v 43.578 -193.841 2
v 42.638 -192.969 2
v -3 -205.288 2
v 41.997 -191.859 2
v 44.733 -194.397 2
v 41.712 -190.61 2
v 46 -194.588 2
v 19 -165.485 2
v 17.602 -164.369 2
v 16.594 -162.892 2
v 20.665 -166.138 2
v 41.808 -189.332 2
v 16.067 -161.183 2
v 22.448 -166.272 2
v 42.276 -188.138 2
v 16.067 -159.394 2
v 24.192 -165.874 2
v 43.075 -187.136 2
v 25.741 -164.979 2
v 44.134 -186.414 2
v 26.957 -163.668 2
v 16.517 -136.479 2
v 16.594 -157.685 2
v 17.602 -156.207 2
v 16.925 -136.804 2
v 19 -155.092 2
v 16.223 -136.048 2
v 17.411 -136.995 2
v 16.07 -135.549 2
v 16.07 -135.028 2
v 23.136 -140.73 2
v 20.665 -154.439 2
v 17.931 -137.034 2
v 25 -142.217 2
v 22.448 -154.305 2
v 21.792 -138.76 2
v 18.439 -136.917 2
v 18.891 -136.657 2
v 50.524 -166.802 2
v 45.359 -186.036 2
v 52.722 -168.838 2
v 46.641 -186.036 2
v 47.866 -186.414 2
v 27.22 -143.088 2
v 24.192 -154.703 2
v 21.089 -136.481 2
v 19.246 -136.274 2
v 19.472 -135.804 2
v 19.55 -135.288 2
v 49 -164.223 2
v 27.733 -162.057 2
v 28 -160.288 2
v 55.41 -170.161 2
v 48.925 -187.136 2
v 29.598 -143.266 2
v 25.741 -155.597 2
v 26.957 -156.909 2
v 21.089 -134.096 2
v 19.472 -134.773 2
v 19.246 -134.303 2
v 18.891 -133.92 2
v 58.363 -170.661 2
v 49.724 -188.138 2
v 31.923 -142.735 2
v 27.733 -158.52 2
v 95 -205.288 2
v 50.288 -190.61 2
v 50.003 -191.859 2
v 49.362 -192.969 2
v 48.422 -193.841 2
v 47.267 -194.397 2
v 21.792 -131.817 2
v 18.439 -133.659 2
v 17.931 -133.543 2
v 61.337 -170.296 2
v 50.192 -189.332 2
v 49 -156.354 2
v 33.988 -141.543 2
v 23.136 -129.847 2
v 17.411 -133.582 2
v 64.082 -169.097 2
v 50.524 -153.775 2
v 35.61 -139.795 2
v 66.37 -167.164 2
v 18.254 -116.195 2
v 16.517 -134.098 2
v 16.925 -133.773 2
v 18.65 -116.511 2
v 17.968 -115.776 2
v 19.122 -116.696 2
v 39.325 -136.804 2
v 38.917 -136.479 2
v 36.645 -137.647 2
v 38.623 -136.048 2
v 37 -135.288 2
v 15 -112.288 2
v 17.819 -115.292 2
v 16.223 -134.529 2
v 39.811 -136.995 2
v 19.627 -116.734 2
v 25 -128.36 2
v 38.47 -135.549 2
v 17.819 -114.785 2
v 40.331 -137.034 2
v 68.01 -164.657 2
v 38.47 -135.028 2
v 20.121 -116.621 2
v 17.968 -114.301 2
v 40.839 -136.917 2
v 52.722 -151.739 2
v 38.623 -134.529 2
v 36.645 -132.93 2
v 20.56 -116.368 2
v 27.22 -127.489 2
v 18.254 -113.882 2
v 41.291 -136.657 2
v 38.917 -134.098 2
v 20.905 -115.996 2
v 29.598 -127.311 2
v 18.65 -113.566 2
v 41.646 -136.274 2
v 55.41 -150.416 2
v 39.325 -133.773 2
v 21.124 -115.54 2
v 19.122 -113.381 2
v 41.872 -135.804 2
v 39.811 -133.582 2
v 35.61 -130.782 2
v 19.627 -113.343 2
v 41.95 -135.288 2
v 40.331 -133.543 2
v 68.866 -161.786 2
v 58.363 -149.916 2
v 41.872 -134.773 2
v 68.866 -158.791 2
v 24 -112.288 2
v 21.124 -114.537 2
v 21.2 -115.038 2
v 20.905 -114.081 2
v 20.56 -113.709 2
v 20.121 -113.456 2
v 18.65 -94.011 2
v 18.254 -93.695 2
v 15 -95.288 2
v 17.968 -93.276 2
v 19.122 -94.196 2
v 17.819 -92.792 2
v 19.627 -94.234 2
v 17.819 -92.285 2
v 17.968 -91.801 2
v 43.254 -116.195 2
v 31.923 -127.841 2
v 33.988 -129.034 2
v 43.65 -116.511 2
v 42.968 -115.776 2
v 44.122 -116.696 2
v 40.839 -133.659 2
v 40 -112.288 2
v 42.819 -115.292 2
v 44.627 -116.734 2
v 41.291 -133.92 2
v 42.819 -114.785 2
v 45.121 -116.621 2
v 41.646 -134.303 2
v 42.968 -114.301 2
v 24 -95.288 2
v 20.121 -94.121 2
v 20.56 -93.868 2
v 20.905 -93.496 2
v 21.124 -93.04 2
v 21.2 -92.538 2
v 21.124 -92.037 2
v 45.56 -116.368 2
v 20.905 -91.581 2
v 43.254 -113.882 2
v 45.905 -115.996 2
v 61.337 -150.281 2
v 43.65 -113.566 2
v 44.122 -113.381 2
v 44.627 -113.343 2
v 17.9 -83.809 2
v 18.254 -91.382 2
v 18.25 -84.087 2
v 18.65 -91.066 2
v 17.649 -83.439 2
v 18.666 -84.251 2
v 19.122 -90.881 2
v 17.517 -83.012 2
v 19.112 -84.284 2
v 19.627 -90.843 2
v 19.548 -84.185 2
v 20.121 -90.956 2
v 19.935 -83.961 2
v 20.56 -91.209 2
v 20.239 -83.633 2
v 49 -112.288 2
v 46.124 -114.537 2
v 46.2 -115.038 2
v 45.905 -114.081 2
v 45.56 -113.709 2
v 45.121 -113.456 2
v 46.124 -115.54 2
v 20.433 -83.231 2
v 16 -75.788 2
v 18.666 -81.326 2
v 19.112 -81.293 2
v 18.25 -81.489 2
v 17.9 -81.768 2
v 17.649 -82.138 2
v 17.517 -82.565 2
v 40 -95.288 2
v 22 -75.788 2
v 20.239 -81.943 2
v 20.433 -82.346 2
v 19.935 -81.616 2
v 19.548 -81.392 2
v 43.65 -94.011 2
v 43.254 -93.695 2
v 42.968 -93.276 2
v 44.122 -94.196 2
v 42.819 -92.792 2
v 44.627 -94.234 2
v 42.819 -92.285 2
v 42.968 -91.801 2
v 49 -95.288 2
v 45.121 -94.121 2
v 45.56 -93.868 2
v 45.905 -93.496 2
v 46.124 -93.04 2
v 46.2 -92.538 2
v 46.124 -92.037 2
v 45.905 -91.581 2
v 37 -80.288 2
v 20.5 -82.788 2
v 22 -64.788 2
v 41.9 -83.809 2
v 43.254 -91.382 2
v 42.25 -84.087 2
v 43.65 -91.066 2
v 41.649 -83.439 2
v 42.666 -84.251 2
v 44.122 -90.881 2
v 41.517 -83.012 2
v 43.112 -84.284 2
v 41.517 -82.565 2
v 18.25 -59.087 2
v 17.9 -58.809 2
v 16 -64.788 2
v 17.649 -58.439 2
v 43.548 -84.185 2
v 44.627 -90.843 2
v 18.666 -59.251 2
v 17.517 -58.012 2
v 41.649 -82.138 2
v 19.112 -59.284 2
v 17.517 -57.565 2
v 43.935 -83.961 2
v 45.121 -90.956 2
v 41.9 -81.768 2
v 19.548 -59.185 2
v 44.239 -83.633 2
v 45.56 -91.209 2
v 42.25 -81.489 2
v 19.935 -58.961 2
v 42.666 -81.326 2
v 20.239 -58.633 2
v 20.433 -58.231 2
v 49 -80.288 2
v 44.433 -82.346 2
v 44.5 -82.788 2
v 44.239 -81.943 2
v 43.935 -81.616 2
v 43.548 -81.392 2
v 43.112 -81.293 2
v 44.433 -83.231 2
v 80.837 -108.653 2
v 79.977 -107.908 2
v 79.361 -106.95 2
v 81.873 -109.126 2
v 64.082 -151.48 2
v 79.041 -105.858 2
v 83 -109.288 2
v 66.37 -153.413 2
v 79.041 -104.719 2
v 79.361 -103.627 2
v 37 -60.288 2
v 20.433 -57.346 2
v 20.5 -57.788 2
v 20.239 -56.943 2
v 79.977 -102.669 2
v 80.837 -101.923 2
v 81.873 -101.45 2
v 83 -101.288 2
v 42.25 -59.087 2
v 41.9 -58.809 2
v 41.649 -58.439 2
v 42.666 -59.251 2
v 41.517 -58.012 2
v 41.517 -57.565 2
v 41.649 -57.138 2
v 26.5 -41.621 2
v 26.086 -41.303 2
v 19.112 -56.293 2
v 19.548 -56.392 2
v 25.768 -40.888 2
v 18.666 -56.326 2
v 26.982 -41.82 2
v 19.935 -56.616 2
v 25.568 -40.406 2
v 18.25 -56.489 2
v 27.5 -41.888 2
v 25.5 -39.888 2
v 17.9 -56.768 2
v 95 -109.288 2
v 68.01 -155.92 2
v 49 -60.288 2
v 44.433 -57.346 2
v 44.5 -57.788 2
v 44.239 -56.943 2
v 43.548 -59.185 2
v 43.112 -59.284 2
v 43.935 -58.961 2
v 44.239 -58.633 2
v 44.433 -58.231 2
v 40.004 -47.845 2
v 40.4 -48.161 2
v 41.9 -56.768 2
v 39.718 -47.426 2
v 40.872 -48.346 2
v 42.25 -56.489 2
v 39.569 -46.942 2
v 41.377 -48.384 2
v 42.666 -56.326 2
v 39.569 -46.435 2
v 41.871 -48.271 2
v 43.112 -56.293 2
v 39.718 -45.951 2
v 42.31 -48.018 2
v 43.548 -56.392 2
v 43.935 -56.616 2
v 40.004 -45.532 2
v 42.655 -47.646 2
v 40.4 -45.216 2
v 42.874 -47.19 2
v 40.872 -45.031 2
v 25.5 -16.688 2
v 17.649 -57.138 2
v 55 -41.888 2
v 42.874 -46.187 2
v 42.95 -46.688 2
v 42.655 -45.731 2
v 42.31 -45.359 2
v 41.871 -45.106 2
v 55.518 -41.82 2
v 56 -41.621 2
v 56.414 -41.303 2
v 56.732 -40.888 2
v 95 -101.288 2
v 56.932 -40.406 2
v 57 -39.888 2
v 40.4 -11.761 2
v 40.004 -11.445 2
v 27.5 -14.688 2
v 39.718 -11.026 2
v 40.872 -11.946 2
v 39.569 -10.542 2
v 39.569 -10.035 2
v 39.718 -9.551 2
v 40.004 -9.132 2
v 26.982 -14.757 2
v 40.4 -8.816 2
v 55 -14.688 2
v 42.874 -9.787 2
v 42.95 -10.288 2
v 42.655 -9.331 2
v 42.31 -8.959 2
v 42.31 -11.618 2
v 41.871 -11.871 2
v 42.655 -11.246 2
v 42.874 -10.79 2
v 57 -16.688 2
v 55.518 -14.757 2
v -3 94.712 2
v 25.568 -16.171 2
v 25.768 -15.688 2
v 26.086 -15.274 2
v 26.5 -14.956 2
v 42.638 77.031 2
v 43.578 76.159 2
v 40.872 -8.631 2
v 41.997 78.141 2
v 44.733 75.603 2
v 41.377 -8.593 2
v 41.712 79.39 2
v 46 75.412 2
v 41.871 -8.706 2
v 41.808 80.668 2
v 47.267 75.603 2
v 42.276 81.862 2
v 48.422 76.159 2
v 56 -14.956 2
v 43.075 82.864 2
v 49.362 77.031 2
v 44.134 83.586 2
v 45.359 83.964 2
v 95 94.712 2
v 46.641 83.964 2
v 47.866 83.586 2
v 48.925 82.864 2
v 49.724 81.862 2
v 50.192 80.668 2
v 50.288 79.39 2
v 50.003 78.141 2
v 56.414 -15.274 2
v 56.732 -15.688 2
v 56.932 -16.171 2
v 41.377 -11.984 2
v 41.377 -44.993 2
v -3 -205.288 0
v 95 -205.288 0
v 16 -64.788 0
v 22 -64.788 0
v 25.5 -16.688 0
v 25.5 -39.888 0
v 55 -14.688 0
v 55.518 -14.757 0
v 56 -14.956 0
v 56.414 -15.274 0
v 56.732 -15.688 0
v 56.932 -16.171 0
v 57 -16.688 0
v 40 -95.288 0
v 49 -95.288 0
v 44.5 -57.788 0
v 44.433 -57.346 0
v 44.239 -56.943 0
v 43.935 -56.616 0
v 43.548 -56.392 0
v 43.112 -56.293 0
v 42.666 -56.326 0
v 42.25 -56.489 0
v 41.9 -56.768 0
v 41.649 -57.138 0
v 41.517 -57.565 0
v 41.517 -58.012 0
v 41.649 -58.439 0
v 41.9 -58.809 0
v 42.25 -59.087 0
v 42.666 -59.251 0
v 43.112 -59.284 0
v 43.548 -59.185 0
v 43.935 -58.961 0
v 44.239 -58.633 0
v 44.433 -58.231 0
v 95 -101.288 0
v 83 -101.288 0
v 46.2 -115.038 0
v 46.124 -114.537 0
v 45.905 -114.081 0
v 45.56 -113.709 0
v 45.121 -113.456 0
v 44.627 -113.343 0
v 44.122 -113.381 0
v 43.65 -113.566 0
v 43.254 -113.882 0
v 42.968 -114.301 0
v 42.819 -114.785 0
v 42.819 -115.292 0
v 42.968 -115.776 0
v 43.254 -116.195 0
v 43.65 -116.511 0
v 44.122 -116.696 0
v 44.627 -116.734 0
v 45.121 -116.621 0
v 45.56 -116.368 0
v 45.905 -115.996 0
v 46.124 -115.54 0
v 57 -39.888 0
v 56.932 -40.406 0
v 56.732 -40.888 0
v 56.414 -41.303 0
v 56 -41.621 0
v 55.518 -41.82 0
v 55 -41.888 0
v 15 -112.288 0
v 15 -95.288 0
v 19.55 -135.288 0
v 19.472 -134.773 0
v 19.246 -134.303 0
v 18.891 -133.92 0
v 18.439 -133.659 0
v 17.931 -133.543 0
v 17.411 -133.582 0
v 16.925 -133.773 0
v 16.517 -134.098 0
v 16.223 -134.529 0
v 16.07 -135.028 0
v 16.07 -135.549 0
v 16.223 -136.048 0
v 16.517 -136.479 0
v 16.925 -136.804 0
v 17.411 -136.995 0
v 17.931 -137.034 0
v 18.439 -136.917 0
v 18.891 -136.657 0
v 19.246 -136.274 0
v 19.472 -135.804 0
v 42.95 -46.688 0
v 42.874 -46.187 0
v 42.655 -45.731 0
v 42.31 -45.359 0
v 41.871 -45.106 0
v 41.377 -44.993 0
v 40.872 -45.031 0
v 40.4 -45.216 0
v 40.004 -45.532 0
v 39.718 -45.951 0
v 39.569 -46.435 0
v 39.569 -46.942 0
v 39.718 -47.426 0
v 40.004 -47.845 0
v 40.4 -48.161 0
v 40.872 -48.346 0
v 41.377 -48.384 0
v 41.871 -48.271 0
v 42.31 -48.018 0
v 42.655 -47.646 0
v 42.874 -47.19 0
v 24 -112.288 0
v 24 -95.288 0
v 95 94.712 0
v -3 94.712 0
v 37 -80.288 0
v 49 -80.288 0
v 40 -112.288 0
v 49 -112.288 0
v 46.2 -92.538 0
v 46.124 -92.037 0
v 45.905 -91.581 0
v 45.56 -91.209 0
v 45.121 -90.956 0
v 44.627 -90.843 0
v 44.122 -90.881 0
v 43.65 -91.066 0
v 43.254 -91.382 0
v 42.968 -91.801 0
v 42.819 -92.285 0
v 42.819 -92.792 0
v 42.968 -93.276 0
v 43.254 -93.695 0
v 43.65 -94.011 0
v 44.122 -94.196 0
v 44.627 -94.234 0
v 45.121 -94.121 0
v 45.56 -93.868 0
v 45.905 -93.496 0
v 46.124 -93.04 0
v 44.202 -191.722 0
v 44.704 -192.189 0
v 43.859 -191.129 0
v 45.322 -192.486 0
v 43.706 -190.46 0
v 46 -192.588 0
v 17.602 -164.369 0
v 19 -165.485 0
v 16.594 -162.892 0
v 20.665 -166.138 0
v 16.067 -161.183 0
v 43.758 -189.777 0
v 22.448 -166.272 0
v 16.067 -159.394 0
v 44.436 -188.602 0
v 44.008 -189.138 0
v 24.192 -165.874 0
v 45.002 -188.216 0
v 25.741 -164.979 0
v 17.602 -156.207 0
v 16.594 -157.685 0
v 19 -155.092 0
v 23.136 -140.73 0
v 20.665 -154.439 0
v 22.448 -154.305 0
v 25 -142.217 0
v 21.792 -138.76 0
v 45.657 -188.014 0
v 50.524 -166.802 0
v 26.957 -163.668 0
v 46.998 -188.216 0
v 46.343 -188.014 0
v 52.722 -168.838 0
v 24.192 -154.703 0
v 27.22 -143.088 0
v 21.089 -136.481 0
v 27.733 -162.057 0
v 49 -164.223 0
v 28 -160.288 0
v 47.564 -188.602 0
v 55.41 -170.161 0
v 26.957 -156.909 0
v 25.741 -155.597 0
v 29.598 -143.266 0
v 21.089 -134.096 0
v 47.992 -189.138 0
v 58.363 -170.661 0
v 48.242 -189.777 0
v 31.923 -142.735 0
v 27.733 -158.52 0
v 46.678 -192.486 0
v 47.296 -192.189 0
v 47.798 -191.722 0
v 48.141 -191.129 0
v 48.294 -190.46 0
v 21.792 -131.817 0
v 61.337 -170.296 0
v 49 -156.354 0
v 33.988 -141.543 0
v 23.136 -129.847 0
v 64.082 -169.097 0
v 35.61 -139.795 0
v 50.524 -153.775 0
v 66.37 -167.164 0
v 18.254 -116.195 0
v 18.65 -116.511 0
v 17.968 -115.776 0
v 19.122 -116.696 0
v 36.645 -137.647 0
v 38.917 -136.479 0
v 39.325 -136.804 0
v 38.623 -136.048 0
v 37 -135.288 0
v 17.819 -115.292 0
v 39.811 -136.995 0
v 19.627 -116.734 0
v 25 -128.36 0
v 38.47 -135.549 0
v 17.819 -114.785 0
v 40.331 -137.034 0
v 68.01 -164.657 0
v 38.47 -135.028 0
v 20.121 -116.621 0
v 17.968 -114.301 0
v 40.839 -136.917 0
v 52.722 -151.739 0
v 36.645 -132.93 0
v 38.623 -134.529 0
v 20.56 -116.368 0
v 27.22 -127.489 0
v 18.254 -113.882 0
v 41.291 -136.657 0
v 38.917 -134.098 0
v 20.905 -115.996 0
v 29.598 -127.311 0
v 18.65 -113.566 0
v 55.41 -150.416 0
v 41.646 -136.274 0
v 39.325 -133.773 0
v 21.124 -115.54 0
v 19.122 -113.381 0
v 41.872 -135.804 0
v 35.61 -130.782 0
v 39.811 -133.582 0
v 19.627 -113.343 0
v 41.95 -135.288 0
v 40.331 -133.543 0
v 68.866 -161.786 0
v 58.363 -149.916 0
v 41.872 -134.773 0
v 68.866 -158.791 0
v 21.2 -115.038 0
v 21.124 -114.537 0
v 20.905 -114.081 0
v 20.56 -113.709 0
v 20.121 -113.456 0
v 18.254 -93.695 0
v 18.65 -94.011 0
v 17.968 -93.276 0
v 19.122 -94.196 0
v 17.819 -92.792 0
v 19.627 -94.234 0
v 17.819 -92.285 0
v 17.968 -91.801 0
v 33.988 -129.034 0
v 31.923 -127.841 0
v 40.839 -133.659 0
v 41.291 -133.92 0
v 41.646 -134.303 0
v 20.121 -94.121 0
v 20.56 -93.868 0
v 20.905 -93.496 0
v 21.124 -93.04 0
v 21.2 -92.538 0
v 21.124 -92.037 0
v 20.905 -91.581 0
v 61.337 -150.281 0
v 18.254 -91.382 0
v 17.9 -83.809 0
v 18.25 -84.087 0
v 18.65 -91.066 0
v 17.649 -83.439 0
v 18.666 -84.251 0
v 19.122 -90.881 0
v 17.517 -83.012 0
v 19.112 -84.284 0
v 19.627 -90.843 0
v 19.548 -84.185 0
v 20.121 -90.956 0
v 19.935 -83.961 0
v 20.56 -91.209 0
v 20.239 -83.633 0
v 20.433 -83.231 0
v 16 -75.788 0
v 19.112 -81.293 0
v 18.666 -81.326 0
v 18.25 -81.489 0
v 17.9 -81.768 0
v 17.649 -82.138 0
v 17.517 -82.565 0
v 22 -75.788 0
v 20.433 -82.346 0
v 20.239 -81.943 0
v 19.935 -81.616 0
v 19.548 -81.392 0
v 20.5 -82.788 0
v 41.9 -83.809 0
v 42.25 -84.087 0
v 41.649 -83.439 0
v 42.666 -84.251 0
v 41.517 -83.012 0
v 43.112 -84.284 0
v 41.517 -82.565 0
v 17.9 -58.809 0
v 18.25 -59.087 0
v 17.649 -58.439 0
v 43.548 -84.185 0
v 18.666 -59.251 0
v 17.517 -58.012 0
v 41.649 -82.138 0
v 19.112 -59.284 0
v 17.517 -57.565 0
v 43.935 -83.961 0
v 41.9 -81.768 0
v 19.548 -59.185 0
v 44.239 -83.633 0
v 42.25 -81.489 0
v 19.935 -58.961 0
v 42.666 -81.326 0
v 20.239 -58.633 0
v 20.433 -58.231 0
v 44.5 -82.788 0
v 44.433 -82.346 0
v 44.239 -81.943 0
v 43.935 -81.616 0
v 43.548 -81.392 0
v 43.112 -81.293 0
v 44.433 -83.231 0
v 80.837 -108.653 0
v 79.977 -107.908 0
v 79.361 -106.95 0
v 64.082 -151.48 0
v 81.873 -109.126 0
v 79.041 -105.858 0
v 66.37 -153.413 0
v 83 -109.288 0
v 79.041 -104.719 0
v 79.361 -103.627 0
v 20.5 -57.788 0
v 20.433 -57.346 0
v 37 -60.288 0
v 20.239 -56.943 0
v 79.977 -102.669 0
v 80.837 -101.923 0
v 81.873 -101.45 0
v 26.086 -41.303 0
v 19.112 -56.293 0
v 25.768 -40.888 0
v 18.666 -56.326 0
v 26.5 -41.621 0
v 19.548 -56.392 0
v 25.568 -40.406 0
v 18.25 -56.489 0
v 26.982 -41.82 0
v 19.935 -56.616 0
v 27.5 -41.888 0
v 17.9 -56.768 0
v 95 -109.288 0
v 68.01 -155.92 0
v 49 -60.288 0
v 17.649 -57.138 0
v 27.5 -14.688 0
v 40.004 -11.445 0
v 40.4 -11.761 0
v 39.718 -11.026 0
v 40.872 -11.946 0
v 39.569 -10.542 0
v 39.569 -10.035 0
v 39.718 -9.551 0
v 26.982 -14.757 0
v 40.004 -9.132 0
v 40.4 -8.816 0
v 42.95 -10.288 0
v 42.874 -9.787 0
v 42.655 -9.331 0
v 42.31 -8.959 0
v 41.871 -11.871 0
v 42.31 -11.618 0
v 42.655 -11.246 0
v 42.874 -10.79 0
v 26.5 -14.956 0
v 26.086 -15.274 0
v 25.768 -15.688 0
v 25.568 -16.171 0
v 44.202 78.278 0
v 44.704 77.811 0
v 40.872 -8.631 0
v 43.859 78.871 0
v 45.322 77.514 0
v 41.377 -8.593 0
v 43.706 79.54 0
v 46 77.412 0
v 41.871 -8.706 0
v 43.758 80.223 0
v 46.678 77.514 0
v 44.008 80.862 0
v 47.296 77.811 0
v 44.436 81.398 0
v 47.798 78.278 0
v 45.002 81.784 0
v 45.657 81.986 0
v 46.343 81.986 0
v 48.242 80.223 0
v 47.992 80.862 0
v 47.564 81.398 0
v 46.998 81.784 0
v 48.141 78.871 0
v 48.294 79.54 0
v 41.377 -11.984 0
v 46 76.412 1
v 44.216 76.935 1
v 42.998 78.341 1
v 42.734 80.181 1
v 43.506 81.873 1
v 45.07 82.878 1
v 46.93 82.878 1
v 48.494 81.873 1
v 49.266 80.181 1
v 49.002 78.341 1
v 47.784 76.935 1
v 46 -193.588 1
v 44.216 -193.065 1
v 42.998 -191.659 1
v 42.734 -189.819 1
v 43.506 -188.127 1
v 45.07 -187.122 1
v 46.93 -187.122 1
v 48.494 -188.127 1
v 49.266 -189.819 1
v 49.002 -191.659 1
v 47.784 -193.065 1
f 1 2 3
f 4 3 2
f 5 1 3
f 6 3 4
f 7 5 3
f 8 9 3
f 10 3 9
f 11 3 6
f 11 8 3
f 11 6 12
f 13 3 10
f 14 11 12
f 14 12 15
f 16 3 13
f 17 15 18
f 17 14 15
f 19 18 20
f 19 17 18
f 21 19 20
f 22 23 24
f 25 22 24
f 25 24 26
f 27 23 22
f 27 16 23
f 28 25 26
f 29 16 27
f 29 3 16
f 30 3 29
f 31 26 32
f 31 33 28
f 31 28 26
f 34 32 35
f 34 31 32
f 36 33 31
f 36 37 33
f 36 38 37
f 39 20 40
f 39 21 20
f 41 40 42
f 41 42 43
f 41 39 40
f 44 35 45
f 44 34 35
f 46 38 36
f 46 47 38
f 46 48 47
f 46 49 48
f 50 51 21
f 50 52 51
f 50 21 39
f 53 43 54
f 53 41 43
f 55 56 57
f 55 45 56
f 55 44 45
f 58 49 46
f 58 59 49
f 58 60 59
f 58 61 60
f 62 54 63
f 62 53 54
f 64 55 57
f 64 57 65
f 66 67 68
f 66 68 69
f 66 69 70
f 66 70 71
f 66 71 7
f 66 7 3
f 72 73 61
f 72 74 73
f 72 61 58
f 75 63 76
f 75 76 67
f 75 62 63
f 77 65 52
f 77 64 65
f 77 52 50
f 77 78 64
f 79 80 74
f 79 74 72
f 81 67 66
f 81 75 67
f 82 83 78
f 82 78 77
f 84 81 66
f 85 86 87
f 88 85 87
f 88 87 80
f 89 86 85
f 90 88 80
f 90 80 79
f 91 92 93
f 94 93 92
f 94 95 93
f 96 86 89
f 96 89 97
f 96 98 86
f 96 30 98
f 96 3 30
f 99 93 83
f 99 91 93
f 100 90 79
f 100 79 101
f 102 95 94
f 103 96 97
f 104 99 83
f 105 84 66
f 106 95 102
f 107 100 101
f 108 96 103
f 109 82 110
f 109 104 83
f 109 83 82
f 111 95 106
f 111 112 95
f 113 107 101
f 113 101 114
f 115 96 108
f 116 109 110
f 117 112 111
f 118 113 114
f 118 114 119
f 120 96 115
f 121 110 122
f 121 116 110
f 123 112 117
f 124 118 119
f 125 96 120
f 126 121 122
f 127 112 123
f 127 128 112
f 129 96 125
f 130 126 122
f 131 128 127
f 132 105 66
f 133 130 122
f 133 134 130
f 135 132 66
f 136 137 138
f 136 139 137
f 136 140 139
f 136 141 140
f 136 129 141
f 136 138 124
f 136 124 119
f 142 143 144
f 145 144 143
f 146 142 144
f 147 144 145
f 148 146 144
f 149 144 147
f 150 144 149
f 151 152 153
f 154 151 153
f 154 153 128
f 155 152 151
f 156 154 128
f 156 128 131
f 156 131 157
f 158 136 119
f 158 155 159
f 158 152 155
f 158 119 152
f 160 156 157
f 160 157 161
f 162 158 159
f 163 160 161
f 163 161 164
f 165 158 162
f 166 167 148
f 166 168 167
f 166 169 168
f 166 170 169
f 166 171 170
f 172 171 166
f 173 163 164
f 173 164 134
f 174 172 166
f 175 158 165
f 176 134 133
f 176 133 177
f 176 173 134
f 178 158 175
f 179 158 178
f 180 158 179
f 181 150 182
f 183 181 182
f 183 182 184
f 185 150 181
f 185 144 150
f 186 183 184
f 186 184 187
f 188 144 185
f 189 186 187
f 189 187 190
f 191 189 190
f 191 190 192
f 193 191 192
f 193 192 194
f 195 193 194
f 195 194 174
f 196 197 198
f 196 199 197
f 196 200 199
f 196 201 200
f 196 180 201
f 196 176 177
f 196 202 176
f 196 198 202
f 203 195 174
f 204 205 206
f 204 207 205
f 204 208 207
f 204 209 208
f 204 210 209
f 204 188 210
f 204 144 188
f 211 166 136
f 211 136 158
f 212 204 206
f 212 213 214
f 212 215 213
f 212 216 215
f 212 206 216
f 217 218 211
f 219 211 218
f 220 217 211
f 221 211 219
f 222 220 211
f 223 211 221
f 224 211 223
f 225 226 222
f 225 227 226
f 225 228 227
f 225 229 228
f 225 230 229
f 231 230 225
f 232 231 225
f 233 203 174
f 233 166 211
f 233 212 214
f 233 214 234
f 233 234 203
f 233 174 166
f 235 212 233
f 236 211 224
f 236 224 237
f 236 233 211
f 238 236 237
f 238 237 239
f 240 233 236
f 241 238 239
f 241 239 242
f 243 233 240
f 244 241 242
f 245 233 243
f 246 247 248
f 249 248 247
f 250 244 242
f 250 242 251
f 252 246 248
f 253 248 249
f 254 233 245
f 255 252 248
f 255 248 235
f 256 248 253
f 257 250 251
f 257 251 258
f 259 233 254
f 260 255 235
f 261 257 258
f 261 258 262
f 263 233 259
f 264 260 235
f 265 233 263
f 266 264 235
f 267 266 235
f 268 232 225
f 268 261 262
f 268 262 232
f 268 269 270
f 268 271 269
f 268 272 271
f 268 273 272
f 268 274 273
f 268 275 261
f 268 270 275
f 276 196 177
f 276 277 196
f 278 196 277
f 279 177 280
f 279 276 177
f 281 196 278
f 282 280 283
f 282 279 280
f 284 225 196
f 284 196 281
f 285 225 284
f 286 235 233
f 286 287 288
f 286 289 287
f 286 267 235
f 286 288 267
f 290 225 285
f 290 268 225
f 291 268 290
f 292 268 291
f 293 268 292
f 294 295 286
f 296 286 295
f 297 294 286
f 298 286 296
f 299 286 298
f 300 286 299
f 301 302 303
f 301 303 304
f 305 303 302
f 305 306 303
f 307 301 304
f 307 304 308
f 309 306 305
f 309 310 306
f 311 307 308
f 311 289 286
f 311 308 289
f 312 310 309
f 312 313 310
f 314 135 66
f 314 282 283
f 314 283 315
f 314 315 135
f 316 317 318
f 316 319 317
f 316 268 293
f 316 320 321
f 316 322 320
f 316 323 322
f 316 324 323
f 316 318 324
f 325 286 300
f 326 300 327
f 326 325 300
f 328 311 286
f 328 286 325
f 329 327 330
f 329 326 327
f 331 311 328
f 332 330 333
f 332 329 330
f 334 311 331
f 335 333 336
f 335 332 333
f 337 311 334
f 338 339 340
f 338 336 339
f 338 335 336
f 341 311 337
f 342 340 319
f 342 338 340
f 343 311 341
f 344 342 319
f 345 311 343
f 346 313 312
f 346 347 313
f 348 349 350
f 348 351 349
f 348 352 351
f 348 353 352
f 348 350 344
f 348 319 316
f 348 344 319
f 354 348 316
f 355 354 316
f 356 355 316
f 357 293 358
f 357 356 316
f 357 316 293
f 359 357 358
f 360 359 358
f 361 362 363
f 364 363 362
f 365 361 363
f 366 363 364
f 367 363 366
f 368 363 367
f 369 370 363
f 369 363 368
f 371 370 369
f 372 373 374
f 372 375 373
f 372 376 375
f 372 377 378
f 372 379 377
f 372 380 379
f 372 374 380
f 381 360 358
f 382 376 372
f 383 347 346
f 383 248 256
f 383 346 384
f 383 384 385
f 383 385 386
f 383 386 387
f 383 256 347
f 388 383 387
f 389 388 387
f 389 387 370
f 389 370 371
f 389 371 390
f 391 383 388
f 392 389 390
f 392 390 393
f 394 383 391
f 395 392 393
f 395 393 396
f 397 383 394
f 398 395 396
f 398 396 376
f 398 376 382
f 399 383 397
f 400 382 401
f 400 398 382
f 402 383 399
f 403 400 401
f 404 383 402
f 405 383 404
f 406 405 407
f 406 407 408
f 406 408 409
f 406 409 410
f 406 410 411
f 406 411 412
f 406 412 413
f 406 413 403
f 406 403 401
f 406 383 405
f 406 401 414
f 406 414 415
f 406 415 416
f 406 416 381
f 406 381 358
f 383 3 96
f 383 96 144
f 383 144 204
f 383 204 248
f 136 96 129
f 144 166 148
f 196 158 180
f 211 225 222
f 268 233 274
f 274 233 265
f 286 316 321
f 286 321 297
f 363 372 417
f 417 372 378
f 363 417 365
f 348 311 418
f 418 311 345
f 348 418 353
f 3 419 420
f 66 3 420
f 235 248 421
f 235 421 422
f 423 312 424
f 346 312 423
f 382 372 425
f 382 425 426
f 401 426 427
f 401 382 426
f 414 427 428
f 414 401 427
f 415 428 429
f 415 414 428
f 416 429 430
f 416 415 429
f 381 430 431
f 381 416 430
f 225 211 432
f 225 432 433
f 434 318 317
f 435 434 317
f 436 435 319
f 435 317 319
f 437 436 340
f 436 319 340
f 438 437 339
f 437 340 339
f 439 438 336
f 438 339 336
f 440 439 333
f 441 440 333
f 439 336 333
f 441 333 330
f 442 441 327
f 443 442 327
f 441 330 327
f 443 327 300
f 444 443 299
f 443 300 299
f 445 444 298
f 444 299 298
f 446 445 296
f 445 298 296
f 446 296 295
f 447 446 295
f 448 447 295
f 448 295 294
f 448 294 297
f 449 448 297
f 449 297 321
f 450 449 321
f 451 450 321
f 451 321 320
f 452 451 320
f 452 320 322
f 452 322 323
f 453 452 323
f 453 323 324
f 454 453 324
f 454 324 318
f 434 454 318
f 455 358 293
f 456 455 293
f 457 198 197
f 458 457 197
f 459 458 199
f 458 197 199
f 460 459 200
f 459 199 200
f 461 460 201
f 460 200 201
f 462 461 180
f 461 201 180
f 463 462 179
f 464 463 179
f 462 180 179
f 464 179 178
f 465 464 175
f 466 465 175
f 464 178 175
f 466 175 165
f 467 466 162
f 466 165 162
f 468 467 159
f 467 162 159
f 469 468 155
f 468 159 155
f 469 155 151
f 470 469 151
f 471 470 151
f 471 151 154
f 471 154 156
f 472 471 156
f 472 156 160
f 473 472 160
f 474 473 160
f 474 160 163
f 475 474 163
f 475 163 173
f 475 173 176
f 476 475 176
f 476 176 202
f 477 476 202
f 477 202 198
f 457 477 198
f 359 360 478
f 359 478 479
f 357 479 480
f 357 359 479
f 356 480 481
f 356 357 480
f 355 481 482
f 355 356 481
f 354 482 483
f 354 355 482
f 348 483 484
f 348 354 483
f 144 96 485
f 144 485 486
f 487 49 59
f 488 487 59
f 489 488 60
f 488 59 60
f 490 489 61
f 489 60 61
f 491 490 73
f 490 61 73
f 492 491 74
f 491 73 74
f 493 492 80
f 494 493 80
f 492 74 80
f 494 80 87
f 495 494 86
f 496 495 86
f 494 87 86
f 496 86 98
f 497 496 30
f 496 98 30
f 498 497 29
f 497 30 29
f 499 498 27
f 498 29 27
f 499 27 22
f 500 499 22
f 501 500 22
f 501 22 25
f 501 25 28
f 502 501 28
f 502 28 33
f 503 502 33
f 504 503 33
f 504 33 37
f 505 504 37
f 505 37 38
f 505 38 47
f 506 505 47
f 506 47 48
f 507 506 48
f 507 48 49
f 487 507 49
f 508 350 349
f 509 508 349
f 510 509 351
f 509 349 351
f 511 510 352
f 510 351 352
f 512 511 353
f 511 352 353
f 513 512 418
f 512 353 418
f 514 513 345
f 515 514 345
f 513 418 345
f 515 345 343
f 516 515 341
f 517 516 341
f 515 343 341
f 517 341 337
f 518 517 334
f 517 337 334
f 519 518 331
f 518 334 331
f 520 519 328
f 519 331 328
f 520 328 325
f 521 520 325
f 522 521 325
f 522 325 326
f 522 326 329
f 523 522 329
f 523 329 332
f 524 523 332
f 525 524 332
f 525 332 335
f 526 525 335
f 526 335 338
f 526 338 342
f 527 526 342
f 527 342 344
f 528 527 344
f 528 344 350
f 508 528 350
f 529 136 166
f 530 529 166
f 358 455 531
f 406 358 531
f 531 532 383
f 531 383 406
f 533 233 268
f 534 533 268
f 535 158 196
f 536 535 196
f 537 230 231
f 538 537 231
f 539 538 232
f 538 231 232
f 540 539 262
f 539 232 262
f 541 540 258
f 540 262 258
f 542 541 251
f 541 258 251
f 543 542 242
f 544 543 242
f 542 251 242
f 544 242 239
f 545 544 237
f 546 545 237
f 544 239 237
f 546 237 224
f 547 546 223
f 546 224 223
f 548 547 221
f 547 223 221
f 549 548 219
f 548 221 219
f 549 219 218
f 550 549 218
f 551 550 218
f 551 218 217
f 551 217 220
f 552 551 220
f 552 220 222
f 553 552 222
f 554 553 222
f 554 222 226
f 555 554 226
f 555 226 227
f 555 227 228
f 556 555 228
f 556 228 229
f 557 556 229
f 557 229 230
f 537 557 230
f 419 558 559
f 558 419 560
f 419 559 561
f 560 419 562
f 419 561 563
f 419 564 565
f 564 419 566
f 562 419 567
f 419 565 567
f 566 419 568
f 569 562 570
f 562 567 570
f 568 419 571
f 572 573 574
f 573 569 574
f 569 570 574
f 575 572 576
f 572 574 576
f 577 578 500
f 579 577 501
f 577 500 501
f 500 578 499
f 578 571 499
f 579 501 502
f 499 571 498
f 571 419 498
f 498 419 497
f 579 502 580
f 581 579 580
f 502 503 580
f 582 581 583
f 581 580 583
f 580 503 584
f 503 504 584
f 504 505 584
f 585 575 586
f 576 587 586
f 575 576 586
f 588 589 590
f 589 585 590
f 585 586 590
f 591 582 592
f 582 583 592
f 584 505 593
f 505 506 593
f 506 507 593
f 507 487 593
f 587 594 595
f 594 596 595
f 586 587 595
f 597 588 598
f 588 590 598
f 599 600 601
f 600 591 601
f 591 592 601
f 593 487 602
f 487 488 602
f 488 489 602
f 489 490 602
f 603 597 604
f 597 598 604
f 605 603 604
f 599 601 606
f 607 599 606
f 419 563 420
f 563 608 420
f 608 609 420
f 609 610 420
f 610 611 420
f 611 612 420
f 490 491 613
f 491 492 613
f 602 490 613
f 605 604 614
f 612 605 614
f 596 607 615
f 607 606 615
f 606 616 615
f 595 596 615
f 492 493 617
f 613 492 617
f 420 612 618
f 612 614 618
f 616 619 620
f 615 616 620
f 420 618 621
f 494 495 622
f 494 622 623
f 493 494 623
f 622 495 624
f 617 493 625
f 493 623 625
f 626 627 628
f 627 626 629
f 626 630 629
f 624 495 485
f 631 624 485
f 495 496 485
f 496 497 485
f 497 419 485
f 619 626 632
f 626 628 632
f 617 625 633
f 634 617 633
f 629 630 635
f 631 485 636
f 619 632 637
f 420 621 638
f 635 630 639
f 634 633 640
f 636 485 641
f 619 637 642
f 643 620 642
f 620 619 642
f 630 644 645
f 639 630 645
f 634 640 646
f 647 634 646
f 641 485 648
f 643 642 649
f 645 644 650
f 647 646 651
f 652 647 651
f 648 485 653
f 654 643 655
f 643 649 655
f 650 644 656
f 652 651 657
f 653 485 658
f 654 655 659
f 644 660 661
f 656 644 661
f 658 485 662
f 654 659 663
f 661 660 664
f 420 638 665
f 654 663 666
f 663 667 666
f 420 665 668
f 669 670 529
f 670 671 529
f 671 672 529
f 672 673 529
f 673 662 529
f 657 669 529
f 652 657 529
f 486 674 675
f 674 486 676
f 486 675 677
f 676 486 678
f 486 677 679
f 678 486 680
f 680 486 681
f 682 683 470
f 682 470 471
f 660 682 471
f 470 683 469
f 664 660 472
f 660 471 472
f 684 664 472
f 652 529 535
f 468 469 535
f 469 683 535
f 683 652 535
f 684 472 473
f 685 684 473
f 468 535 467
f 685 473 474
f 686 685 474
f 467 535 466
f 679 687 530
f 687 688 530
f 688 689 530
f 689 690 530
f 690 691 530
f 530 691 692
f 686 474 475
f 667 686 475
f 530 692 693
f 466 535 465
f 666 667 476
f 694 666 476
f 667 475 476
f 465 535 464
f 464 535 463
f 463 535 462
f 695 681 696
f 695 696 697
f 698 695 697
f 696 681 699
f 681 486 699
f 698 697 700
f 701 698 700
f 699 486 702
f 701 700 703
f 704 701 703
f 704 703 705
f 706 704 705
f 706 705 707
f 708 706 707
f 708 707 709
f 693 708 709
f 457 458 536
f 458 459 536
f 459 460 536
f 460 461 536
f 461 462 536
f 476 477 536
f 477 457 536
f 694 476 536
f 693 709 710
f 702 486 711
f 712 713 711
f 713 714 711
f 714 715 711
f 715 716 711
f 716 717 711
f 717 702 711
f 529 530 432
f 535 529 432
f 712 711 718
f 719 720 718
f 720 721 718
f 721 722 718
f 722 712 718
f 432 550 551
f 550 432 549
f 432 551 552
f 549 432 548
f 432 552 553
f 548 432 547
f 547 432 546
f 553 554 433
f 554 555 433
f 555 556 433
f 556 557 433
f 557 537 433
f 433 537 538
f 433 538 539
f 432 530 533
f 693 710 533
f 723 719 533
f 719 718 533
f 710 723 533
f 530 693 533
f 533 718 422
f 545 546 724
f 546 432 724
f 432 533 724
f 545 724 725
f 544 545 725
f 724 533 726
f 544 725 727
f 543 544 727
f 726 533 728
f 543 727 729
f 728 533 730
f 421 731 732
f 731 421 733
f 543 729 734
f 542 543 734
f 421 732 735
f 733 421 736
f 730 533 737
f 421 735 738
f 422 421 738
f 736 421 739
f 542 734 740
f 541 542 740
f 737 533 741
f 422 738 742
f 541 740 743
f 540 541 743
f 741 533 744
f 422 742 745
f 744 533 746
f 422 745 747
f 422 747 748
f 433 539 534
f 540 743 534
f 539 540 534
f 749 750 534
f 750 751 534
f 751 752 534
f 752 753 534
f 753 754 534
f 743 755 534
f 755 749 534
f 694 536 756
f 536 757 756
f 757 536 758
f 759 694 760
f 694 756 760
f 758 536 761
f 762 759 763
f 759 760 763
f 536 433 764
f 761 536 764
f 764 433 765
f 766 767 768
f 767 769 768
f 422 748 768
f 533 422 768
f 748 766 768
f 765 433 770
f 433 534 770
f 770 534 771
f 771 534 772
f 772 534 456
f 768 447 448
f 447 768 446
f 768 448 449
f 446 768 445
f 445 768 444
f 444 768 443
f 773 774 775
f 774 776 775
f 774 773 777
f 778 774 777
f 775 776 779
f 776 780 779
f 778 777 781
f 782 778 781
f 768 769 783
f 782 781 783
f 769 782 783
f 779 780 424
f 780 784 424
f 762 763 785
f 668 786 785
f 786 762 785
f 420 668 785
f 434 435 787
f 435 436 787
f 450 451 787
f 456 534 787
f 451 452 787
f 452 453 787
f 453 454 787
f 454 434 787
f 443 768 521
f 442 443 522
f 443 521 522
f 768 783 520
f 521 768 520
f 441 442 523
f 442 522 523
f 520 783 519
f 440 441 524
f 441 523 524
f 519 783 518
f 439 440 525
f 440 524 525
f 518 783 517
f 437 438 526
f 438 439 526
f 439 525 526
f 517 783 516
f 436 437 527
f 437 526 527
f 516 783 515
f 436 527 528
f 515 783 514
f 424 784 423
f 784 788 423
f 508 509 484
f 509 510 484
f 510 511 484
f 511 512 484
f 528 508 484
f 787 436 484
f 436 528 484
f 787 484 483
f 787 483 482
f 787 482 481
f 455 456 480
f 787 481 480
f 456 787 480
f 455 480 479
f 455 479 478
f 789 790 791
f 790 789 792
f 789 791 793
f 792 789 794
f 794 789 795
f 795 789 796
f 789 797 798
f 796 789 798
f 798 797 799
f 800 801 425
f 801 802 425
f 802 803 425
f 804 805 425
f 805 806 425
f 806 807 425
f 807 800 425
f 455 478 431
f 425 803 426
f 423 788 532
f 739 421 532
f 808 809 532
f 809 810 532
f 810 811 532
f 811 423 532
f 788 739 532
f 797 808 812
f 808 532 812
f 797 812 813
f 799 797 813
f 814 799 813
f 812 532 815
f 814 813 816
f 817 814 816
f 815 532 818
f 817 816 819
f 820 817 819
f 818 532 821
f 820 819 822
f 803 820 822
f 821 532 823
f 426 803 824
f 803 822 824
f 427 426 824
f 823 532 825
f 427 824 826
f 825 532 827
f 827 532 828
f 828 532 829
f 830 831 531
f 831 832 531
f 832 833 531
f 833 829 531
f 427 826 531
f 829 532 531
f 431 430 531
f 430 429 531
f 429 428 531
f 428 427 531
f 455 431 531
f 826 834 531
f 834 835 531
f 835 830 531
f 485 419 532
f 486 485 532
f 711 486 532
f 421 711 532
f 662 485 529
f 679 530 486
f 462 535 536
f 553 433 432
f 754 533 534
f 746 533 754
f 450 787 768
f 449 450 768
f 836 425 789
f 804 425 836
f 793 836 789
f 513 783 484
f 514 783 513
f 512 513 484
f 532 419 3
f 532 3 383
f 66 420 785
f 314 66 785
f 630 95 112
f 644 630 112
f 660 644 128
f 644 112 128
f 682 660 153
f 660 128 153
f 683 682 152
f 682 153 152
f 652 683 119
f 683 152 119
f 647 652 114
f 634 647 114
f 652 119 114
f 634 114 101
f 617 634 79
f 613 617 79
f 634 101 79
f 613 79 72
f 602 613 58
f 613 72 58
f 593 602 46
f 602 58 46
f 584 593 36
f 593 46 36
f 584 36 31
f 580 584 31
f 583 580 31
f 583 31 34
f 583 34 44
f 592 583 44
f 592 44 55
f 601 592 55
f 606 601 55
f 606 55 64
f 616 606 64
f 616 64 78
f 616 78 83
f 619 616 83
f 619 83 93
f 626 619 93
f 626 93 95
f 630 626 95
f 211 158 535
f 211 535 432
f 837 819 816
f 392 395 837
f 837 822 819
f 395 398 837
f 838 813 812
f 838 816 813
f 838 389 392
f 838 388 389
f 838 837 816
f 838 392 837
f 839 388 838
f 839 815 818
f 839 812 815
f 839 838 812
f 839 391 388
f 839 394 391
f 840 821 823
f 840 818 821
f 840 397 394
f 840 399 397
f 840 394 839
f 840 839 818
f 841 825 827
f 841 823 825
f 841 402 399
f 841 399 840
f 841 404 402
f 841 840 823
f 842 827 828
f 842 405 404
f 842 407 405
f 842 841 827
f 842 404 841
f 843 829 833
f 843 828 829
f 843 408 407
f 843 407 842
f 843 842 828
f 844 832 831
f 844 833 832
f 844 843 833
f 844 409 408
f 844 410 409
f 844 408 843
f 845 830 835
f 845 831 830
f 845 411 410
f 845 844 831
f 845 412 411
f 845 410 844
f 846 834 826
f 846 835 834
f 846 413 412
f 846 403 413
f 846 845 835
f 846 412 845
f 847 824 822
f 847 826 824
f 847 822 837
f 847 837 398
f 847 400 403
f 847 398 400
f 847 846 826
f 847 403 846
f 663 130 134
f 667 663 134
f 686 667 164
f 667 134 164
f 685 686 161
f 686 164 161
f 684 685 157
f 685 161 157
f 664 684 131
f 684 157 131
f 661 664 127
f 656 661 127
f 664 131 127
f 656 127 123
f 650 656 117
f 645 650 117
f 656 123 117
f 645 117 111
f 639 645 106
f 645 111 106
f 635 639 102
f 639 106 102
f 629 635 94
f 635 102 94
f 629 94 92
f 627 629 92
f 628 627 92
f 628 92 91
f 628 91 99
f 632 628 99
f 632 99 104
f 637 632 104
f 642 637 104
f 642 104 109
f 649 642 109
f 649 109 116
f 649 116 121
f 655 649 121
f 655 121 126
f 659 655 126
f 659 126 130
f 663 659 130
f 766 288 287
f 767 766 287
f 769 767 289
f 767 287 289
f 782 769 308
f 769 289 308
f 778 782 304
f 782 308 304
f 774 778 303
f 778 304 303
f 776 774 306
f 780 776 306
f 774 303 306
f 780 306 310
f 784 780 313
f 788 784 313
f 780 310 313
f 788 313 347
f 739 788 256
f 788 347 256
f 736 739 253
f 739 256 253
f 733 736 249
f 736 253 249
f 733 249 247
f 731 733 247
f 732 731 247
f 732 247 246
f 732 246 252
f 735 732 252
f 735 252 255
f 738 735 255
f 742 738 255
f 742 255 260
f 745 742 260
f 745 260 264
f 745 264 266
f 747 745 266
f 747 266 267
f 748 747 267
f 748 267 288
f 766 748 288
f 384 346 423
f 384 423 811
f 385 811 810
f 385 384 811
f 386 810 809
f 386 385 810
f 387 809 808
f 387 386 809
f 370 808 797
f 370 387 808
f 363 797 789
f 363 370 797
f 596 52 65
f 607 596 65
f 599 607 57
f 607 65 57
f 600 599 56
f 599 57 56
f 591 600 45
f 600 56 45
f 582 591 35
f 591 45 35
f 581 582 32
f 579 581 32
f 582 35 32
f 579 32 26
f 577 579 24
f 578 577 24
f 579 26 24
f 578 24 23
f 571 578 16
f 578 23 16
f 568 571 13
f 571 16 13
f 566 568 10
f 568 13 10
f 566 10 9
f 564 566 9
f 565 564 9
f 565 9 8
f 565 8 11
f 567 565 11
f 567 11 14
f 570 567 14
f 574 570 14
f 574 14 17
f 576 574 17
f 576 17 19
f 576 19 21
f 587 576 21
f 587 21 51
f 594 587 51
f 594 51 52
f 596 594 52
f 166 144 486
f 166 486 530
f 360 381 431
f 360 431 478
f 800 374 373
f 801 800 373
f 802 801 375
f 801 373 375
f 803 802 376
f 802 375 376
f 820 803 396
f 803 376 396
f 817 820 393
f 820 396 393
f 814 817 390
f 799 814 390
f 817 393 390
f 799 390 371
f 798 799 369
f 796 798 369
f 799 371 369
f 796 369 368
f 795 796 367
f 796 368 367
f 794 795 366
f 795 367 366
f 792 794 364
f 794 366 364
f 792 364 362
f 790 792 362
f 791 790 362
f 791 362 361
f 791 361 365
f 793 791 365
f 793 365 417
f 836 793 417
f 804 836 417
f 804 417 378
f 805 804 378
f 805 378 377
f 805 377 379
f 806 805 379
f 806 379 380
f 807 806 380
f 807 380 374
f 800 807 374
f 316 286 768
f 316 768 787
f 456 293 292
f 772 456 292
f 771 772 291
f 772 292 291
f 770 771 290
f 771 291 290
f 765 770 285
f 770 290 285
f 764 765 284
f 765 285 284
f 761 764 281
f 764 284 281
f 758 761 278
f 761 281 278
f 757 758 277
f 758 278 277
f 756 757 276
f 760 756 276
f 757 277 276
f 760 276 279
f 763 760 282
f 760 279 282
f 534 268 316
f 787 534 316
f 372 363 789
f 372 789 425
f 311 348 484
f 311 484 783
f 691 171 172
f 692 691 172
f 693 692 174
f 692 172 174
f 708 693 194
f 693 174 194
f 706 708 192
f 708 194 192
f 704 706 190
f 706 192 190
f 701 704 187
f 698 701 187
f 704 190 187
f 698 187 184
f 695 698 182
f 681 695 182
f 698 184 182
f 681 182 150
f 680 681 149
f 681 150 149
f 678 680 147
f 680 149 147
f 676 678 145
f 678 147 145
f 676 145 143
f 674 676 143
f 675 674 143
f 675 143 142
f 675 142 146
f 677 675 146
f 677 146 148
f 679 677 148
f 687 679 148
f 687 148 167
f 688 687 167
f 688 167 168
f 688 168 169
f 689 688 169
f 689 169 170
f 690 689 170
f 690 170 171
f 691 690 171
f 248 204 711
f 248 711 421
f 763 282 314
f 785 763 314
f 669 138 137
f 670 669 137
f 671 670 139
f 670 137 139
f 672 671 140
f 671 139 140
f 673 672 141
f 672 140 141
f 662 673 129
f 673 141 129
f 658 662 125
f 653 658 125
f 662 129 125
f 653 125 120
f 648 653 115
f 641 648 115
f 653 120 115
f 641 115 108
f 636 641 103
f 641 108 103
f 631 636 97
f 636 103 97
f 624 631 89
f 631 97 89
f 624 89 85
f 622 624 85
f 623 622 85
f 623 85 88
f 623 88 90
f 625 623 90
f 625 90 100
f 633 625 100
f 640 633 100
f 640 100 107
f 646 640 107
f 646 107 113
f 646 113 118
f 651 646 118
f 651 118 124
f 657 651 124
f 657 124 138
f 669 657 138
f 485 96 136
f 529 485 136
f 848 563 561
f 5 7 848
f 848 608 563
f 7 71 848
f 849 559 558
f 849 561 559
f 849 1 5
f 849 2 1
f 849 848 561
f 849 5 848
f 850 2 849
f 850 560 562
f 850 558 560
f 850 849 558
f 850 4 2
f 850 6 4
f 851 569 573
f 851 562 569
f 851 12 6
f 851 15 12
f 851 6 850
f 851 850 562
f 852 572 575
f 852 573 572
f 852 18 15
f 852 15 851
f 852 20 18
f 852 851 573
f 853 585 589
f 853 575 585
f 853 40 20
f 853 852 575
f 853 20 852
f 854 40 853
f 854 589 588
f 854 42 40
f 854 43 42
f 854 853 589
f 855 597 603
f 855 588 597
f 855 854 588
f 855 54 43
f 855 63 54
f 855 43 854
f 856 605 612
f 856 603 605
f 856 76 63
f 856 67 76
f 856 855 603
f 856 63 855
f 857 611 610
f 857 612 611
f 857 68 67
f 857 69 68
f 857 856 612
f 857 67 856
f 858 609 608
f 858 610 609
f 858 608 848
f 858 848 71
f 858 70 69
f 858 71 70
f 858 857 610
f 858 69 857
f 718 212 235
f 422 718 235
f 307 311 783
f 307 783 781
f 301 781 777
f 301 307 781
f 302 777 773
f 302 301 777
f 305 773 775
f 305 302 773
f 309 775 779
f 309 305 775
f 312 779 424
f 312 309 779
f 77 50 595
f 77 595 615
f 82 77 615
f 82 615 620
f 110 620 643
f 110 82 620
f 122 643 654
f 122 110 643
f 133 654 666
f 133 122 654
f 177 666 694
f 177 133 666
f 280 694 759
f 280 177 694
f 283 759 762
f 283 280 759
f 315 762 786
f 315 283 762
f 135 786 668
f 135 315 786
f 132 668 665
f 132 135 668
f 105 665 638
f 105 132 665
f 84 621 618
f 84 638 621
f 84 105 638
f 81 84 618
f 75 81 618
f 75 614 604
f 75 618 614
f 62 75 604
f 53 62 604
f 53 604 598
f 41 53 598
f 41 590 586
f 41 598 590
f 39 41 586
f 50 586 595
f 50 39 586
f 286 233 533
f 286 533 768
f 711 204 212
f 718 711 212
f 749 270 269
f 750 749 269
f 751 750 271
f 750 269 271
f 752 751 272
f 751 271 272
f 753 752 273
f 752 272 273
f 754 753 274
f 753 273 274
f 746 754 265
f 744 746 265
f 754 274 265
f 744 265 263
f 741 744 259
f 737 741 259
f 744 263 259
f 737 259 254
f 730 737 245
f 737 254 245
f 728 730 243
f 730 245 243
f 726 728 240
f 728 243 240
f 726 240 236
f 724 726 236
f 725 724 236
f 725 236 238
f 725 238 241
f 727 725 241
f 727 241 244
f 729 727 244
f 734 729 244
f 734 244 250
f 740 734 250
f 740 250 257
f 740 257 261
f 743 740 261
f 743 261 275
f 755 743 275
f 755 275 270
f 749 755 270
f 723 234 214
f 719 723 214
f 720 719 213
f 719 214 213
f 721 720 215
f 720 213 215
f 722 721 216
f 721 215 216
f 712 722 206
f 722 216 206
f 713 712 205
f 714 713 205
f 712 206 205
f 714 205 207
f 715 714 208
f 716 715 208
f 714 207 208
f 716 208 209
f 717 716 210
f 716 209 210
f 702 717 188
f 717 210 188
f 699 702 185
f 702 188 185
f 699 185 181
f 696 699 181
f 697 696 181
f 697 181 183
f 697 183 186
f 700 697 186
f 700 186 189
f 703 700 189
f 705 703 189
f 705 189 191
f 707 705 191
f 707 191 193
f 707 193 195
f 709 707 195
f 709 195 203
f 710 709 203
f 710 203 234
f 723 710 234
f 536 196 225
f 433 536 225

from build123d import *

# Parameters (mm, degrees)
SKIZZE2_W                                   = 98
SKIZZE2_H                                   = 300
AUFSATZ_LINEAR_AUSTRAGEN1_DEPTH             = 2
FORMSENKUNG_F_R_M4_SENKSCHRAUBE_MIT_2_COUNT = 2
FORMSENKUNG_F_R_M4_SENKSCHRAUBE_MIT_2_PITCH = 270
SKIZZE6_R                                   = 1.7
SKIZZE6_R_2                                 = 8
SKIZZE6_R_3                                 = 1.5
SKIZZE6_R_4                                 = 6
SKIZZE6_R_5                                 = 1.75
SKIZZE6_W                                   = 9
SKIZZE6_H                                   = 17
SKIZZE6_W_2                                 = 12
SKIZZE6_H_2                                 = 20
SKIZZE6_W_3                                 = 6
SKIZZE6_H_3                                 = 11
SCHNITT_LINEAR_AUSTRAGEN1_DEPTH             = 10


with BuildPart() as part:
    # Skizze2 → Aufsatz-Linear austragen1 (new body)
    with BuildSketch(Plane.XY):
        with Locations((46, -55.288461538)):
            Rectangle(SKIZZE2_W, SKIZZE2_H)
    extrude(amount=AUFSATZ_LINEAR_AUSTRAGEN1_DEPTH)

    # Skizze4 → Formsenkung für M4 Senkschraube mit Innensechskant1 (revolve, cut)
    with BuildSketch(Plane(origin=(46, 79.711538462, 2), x_dir=(0, -1, 0), z_dir=(1, 0, 0))):
        Polygon((0, 0), (0, 2), (2.25, 2), (2.25, 2.05), (4.3, 0), align=None)
    formsenkung_f_r_m4_senkschraube_mit_inne = revolve(axis=Axis((46, 79.711538462, 8.35), (0, 0, -1)), mode=Mode.SUBTRACT)

    # Formsenkung f_r M4 Senkschraube mit  2: Formsenkung für M4 Senkschraube mit Innensechskant1 ×2
    with Locations(*[(0, -i * FORMSENKUNG_F_R_M4_SENKSCHRAUBE_MIT_2_PITCH, 0) for i in range(1, FORMSENKUNG_F_R_M4_SENKSCHRAUBE_MIT_2_COUNT)]):
        add(formsenkung_f_r_m4_senkschraube_mit_inne, mode=Mode.SUBTRACT)

    # Skizze6 → Schnitt-Linear austragen1 (cut)
    with BuildSketch(Plane.XY.offset(2)):
        with Locations((41.25, -10.288461538)):
            Circle(SKIZZE6_R)
        with Locations((41.25, -46.688461538)):
            Circle(SKIZZE6_R)
        with Locations((44.5, -92.538461538)):
            Circle(SKIZZE6_R)
        with Locations((44.5, -115.038461538)):
            Circle(SKIZZE6_R)
        with Locations((29, -135.288461538)):
            Circle(SKIZZE6_R_2)
        with Locations((43, -57.788461538)):
            Circle(SKIZZE6_R_3)
        with Locations((43, -82.788461538)):
            Circle(SKIZZE6_R_3)
        with Locations((22, -160.288461538)):
            Circle(SKIZZE6_R_4)
        with Locations((40.2, -135.288461538)):
            Circle(SKIZZE6_R_5)
        with Locations((17.8, -135.288461538)):
            Circle(SKIZZE6_R_5)
        with Locations((19.5, -115.038461538)):
            Circle(SKIZZE6_R)
        with Locations((19.5, -92.538461538)):
            Circle(SKIZZE6_R)
        with Locations((19, -57.788461538)):
            Circle(SKIZZE6_R_3)
        with Locations((19, -82.788461538)):
            Circle(SKIZZE6_R_3)
        with BuildLine():
            Line((27.5, -14.688461538), (55, -14.688461538))
            ThreePointArc((55, -14.688461538), (56.414213562, -15.274247976), (57, -16.688461538))
            Line((57, -16.688461538), (57, -39.888461538))
            ThreePointArc((57, -39.888461538), (56.414213562, -41.302675101), (55, -41.888461538))
            Line((55, -41.888461538), (27.5, -41.888461538))
            ThreePointArc((27.5, -41.888461538), (26.085786438, -41.302675101), (25.5, -39.888461538))
            Line((25.5, -39.888461538), (25.5, -16.688461538))
            ThreePointArc((25.5, -16.688461538), (26.085786438, -15.274247976), (27.5, -14.688461538))
        make_face()
        with Locations((44.5, -103.788461538)):
            Rectangle(SKIZZE6_W, SKIZZE6_H)
        with Locations((43, -70.288461538)):
            Rectangle(SKIZZE6_W_2, SKIZZE6_H_2)
        with Locations((19, -70.288461538)):
            Rectangle(SKIZZE6_W_3, SKIZZE6_H_3)
        with BuildLine():
            Line((49, -164.223004079), (49, -156.353918998))
            ThreePointArc((49, -156.353918998), (68.975, -160.288461538), (49, -164.223004079))
        make_face()
        with Locations((19.5, -103.788461538)):
            Rectangle(SKIZZE6_W, SKIZZE6_H)
        with BuildLine():
            Line((95, -101.288461538), (83, -101.288461538))
            ThreePointArc((83, -101.288461538), (79, -105.288461538), (83, -109.288461538))
            Line((83, -109.288461538), (95, -109.288461538))
            Line((95, -109.288461538), (95, -101.288461538))
        make_face()
    extrude(amount=-SCHNITT_LINEAR_AUSTRAGEN1_DEPTH, mode=Mode.SUBTRACT)


solid = part.part
